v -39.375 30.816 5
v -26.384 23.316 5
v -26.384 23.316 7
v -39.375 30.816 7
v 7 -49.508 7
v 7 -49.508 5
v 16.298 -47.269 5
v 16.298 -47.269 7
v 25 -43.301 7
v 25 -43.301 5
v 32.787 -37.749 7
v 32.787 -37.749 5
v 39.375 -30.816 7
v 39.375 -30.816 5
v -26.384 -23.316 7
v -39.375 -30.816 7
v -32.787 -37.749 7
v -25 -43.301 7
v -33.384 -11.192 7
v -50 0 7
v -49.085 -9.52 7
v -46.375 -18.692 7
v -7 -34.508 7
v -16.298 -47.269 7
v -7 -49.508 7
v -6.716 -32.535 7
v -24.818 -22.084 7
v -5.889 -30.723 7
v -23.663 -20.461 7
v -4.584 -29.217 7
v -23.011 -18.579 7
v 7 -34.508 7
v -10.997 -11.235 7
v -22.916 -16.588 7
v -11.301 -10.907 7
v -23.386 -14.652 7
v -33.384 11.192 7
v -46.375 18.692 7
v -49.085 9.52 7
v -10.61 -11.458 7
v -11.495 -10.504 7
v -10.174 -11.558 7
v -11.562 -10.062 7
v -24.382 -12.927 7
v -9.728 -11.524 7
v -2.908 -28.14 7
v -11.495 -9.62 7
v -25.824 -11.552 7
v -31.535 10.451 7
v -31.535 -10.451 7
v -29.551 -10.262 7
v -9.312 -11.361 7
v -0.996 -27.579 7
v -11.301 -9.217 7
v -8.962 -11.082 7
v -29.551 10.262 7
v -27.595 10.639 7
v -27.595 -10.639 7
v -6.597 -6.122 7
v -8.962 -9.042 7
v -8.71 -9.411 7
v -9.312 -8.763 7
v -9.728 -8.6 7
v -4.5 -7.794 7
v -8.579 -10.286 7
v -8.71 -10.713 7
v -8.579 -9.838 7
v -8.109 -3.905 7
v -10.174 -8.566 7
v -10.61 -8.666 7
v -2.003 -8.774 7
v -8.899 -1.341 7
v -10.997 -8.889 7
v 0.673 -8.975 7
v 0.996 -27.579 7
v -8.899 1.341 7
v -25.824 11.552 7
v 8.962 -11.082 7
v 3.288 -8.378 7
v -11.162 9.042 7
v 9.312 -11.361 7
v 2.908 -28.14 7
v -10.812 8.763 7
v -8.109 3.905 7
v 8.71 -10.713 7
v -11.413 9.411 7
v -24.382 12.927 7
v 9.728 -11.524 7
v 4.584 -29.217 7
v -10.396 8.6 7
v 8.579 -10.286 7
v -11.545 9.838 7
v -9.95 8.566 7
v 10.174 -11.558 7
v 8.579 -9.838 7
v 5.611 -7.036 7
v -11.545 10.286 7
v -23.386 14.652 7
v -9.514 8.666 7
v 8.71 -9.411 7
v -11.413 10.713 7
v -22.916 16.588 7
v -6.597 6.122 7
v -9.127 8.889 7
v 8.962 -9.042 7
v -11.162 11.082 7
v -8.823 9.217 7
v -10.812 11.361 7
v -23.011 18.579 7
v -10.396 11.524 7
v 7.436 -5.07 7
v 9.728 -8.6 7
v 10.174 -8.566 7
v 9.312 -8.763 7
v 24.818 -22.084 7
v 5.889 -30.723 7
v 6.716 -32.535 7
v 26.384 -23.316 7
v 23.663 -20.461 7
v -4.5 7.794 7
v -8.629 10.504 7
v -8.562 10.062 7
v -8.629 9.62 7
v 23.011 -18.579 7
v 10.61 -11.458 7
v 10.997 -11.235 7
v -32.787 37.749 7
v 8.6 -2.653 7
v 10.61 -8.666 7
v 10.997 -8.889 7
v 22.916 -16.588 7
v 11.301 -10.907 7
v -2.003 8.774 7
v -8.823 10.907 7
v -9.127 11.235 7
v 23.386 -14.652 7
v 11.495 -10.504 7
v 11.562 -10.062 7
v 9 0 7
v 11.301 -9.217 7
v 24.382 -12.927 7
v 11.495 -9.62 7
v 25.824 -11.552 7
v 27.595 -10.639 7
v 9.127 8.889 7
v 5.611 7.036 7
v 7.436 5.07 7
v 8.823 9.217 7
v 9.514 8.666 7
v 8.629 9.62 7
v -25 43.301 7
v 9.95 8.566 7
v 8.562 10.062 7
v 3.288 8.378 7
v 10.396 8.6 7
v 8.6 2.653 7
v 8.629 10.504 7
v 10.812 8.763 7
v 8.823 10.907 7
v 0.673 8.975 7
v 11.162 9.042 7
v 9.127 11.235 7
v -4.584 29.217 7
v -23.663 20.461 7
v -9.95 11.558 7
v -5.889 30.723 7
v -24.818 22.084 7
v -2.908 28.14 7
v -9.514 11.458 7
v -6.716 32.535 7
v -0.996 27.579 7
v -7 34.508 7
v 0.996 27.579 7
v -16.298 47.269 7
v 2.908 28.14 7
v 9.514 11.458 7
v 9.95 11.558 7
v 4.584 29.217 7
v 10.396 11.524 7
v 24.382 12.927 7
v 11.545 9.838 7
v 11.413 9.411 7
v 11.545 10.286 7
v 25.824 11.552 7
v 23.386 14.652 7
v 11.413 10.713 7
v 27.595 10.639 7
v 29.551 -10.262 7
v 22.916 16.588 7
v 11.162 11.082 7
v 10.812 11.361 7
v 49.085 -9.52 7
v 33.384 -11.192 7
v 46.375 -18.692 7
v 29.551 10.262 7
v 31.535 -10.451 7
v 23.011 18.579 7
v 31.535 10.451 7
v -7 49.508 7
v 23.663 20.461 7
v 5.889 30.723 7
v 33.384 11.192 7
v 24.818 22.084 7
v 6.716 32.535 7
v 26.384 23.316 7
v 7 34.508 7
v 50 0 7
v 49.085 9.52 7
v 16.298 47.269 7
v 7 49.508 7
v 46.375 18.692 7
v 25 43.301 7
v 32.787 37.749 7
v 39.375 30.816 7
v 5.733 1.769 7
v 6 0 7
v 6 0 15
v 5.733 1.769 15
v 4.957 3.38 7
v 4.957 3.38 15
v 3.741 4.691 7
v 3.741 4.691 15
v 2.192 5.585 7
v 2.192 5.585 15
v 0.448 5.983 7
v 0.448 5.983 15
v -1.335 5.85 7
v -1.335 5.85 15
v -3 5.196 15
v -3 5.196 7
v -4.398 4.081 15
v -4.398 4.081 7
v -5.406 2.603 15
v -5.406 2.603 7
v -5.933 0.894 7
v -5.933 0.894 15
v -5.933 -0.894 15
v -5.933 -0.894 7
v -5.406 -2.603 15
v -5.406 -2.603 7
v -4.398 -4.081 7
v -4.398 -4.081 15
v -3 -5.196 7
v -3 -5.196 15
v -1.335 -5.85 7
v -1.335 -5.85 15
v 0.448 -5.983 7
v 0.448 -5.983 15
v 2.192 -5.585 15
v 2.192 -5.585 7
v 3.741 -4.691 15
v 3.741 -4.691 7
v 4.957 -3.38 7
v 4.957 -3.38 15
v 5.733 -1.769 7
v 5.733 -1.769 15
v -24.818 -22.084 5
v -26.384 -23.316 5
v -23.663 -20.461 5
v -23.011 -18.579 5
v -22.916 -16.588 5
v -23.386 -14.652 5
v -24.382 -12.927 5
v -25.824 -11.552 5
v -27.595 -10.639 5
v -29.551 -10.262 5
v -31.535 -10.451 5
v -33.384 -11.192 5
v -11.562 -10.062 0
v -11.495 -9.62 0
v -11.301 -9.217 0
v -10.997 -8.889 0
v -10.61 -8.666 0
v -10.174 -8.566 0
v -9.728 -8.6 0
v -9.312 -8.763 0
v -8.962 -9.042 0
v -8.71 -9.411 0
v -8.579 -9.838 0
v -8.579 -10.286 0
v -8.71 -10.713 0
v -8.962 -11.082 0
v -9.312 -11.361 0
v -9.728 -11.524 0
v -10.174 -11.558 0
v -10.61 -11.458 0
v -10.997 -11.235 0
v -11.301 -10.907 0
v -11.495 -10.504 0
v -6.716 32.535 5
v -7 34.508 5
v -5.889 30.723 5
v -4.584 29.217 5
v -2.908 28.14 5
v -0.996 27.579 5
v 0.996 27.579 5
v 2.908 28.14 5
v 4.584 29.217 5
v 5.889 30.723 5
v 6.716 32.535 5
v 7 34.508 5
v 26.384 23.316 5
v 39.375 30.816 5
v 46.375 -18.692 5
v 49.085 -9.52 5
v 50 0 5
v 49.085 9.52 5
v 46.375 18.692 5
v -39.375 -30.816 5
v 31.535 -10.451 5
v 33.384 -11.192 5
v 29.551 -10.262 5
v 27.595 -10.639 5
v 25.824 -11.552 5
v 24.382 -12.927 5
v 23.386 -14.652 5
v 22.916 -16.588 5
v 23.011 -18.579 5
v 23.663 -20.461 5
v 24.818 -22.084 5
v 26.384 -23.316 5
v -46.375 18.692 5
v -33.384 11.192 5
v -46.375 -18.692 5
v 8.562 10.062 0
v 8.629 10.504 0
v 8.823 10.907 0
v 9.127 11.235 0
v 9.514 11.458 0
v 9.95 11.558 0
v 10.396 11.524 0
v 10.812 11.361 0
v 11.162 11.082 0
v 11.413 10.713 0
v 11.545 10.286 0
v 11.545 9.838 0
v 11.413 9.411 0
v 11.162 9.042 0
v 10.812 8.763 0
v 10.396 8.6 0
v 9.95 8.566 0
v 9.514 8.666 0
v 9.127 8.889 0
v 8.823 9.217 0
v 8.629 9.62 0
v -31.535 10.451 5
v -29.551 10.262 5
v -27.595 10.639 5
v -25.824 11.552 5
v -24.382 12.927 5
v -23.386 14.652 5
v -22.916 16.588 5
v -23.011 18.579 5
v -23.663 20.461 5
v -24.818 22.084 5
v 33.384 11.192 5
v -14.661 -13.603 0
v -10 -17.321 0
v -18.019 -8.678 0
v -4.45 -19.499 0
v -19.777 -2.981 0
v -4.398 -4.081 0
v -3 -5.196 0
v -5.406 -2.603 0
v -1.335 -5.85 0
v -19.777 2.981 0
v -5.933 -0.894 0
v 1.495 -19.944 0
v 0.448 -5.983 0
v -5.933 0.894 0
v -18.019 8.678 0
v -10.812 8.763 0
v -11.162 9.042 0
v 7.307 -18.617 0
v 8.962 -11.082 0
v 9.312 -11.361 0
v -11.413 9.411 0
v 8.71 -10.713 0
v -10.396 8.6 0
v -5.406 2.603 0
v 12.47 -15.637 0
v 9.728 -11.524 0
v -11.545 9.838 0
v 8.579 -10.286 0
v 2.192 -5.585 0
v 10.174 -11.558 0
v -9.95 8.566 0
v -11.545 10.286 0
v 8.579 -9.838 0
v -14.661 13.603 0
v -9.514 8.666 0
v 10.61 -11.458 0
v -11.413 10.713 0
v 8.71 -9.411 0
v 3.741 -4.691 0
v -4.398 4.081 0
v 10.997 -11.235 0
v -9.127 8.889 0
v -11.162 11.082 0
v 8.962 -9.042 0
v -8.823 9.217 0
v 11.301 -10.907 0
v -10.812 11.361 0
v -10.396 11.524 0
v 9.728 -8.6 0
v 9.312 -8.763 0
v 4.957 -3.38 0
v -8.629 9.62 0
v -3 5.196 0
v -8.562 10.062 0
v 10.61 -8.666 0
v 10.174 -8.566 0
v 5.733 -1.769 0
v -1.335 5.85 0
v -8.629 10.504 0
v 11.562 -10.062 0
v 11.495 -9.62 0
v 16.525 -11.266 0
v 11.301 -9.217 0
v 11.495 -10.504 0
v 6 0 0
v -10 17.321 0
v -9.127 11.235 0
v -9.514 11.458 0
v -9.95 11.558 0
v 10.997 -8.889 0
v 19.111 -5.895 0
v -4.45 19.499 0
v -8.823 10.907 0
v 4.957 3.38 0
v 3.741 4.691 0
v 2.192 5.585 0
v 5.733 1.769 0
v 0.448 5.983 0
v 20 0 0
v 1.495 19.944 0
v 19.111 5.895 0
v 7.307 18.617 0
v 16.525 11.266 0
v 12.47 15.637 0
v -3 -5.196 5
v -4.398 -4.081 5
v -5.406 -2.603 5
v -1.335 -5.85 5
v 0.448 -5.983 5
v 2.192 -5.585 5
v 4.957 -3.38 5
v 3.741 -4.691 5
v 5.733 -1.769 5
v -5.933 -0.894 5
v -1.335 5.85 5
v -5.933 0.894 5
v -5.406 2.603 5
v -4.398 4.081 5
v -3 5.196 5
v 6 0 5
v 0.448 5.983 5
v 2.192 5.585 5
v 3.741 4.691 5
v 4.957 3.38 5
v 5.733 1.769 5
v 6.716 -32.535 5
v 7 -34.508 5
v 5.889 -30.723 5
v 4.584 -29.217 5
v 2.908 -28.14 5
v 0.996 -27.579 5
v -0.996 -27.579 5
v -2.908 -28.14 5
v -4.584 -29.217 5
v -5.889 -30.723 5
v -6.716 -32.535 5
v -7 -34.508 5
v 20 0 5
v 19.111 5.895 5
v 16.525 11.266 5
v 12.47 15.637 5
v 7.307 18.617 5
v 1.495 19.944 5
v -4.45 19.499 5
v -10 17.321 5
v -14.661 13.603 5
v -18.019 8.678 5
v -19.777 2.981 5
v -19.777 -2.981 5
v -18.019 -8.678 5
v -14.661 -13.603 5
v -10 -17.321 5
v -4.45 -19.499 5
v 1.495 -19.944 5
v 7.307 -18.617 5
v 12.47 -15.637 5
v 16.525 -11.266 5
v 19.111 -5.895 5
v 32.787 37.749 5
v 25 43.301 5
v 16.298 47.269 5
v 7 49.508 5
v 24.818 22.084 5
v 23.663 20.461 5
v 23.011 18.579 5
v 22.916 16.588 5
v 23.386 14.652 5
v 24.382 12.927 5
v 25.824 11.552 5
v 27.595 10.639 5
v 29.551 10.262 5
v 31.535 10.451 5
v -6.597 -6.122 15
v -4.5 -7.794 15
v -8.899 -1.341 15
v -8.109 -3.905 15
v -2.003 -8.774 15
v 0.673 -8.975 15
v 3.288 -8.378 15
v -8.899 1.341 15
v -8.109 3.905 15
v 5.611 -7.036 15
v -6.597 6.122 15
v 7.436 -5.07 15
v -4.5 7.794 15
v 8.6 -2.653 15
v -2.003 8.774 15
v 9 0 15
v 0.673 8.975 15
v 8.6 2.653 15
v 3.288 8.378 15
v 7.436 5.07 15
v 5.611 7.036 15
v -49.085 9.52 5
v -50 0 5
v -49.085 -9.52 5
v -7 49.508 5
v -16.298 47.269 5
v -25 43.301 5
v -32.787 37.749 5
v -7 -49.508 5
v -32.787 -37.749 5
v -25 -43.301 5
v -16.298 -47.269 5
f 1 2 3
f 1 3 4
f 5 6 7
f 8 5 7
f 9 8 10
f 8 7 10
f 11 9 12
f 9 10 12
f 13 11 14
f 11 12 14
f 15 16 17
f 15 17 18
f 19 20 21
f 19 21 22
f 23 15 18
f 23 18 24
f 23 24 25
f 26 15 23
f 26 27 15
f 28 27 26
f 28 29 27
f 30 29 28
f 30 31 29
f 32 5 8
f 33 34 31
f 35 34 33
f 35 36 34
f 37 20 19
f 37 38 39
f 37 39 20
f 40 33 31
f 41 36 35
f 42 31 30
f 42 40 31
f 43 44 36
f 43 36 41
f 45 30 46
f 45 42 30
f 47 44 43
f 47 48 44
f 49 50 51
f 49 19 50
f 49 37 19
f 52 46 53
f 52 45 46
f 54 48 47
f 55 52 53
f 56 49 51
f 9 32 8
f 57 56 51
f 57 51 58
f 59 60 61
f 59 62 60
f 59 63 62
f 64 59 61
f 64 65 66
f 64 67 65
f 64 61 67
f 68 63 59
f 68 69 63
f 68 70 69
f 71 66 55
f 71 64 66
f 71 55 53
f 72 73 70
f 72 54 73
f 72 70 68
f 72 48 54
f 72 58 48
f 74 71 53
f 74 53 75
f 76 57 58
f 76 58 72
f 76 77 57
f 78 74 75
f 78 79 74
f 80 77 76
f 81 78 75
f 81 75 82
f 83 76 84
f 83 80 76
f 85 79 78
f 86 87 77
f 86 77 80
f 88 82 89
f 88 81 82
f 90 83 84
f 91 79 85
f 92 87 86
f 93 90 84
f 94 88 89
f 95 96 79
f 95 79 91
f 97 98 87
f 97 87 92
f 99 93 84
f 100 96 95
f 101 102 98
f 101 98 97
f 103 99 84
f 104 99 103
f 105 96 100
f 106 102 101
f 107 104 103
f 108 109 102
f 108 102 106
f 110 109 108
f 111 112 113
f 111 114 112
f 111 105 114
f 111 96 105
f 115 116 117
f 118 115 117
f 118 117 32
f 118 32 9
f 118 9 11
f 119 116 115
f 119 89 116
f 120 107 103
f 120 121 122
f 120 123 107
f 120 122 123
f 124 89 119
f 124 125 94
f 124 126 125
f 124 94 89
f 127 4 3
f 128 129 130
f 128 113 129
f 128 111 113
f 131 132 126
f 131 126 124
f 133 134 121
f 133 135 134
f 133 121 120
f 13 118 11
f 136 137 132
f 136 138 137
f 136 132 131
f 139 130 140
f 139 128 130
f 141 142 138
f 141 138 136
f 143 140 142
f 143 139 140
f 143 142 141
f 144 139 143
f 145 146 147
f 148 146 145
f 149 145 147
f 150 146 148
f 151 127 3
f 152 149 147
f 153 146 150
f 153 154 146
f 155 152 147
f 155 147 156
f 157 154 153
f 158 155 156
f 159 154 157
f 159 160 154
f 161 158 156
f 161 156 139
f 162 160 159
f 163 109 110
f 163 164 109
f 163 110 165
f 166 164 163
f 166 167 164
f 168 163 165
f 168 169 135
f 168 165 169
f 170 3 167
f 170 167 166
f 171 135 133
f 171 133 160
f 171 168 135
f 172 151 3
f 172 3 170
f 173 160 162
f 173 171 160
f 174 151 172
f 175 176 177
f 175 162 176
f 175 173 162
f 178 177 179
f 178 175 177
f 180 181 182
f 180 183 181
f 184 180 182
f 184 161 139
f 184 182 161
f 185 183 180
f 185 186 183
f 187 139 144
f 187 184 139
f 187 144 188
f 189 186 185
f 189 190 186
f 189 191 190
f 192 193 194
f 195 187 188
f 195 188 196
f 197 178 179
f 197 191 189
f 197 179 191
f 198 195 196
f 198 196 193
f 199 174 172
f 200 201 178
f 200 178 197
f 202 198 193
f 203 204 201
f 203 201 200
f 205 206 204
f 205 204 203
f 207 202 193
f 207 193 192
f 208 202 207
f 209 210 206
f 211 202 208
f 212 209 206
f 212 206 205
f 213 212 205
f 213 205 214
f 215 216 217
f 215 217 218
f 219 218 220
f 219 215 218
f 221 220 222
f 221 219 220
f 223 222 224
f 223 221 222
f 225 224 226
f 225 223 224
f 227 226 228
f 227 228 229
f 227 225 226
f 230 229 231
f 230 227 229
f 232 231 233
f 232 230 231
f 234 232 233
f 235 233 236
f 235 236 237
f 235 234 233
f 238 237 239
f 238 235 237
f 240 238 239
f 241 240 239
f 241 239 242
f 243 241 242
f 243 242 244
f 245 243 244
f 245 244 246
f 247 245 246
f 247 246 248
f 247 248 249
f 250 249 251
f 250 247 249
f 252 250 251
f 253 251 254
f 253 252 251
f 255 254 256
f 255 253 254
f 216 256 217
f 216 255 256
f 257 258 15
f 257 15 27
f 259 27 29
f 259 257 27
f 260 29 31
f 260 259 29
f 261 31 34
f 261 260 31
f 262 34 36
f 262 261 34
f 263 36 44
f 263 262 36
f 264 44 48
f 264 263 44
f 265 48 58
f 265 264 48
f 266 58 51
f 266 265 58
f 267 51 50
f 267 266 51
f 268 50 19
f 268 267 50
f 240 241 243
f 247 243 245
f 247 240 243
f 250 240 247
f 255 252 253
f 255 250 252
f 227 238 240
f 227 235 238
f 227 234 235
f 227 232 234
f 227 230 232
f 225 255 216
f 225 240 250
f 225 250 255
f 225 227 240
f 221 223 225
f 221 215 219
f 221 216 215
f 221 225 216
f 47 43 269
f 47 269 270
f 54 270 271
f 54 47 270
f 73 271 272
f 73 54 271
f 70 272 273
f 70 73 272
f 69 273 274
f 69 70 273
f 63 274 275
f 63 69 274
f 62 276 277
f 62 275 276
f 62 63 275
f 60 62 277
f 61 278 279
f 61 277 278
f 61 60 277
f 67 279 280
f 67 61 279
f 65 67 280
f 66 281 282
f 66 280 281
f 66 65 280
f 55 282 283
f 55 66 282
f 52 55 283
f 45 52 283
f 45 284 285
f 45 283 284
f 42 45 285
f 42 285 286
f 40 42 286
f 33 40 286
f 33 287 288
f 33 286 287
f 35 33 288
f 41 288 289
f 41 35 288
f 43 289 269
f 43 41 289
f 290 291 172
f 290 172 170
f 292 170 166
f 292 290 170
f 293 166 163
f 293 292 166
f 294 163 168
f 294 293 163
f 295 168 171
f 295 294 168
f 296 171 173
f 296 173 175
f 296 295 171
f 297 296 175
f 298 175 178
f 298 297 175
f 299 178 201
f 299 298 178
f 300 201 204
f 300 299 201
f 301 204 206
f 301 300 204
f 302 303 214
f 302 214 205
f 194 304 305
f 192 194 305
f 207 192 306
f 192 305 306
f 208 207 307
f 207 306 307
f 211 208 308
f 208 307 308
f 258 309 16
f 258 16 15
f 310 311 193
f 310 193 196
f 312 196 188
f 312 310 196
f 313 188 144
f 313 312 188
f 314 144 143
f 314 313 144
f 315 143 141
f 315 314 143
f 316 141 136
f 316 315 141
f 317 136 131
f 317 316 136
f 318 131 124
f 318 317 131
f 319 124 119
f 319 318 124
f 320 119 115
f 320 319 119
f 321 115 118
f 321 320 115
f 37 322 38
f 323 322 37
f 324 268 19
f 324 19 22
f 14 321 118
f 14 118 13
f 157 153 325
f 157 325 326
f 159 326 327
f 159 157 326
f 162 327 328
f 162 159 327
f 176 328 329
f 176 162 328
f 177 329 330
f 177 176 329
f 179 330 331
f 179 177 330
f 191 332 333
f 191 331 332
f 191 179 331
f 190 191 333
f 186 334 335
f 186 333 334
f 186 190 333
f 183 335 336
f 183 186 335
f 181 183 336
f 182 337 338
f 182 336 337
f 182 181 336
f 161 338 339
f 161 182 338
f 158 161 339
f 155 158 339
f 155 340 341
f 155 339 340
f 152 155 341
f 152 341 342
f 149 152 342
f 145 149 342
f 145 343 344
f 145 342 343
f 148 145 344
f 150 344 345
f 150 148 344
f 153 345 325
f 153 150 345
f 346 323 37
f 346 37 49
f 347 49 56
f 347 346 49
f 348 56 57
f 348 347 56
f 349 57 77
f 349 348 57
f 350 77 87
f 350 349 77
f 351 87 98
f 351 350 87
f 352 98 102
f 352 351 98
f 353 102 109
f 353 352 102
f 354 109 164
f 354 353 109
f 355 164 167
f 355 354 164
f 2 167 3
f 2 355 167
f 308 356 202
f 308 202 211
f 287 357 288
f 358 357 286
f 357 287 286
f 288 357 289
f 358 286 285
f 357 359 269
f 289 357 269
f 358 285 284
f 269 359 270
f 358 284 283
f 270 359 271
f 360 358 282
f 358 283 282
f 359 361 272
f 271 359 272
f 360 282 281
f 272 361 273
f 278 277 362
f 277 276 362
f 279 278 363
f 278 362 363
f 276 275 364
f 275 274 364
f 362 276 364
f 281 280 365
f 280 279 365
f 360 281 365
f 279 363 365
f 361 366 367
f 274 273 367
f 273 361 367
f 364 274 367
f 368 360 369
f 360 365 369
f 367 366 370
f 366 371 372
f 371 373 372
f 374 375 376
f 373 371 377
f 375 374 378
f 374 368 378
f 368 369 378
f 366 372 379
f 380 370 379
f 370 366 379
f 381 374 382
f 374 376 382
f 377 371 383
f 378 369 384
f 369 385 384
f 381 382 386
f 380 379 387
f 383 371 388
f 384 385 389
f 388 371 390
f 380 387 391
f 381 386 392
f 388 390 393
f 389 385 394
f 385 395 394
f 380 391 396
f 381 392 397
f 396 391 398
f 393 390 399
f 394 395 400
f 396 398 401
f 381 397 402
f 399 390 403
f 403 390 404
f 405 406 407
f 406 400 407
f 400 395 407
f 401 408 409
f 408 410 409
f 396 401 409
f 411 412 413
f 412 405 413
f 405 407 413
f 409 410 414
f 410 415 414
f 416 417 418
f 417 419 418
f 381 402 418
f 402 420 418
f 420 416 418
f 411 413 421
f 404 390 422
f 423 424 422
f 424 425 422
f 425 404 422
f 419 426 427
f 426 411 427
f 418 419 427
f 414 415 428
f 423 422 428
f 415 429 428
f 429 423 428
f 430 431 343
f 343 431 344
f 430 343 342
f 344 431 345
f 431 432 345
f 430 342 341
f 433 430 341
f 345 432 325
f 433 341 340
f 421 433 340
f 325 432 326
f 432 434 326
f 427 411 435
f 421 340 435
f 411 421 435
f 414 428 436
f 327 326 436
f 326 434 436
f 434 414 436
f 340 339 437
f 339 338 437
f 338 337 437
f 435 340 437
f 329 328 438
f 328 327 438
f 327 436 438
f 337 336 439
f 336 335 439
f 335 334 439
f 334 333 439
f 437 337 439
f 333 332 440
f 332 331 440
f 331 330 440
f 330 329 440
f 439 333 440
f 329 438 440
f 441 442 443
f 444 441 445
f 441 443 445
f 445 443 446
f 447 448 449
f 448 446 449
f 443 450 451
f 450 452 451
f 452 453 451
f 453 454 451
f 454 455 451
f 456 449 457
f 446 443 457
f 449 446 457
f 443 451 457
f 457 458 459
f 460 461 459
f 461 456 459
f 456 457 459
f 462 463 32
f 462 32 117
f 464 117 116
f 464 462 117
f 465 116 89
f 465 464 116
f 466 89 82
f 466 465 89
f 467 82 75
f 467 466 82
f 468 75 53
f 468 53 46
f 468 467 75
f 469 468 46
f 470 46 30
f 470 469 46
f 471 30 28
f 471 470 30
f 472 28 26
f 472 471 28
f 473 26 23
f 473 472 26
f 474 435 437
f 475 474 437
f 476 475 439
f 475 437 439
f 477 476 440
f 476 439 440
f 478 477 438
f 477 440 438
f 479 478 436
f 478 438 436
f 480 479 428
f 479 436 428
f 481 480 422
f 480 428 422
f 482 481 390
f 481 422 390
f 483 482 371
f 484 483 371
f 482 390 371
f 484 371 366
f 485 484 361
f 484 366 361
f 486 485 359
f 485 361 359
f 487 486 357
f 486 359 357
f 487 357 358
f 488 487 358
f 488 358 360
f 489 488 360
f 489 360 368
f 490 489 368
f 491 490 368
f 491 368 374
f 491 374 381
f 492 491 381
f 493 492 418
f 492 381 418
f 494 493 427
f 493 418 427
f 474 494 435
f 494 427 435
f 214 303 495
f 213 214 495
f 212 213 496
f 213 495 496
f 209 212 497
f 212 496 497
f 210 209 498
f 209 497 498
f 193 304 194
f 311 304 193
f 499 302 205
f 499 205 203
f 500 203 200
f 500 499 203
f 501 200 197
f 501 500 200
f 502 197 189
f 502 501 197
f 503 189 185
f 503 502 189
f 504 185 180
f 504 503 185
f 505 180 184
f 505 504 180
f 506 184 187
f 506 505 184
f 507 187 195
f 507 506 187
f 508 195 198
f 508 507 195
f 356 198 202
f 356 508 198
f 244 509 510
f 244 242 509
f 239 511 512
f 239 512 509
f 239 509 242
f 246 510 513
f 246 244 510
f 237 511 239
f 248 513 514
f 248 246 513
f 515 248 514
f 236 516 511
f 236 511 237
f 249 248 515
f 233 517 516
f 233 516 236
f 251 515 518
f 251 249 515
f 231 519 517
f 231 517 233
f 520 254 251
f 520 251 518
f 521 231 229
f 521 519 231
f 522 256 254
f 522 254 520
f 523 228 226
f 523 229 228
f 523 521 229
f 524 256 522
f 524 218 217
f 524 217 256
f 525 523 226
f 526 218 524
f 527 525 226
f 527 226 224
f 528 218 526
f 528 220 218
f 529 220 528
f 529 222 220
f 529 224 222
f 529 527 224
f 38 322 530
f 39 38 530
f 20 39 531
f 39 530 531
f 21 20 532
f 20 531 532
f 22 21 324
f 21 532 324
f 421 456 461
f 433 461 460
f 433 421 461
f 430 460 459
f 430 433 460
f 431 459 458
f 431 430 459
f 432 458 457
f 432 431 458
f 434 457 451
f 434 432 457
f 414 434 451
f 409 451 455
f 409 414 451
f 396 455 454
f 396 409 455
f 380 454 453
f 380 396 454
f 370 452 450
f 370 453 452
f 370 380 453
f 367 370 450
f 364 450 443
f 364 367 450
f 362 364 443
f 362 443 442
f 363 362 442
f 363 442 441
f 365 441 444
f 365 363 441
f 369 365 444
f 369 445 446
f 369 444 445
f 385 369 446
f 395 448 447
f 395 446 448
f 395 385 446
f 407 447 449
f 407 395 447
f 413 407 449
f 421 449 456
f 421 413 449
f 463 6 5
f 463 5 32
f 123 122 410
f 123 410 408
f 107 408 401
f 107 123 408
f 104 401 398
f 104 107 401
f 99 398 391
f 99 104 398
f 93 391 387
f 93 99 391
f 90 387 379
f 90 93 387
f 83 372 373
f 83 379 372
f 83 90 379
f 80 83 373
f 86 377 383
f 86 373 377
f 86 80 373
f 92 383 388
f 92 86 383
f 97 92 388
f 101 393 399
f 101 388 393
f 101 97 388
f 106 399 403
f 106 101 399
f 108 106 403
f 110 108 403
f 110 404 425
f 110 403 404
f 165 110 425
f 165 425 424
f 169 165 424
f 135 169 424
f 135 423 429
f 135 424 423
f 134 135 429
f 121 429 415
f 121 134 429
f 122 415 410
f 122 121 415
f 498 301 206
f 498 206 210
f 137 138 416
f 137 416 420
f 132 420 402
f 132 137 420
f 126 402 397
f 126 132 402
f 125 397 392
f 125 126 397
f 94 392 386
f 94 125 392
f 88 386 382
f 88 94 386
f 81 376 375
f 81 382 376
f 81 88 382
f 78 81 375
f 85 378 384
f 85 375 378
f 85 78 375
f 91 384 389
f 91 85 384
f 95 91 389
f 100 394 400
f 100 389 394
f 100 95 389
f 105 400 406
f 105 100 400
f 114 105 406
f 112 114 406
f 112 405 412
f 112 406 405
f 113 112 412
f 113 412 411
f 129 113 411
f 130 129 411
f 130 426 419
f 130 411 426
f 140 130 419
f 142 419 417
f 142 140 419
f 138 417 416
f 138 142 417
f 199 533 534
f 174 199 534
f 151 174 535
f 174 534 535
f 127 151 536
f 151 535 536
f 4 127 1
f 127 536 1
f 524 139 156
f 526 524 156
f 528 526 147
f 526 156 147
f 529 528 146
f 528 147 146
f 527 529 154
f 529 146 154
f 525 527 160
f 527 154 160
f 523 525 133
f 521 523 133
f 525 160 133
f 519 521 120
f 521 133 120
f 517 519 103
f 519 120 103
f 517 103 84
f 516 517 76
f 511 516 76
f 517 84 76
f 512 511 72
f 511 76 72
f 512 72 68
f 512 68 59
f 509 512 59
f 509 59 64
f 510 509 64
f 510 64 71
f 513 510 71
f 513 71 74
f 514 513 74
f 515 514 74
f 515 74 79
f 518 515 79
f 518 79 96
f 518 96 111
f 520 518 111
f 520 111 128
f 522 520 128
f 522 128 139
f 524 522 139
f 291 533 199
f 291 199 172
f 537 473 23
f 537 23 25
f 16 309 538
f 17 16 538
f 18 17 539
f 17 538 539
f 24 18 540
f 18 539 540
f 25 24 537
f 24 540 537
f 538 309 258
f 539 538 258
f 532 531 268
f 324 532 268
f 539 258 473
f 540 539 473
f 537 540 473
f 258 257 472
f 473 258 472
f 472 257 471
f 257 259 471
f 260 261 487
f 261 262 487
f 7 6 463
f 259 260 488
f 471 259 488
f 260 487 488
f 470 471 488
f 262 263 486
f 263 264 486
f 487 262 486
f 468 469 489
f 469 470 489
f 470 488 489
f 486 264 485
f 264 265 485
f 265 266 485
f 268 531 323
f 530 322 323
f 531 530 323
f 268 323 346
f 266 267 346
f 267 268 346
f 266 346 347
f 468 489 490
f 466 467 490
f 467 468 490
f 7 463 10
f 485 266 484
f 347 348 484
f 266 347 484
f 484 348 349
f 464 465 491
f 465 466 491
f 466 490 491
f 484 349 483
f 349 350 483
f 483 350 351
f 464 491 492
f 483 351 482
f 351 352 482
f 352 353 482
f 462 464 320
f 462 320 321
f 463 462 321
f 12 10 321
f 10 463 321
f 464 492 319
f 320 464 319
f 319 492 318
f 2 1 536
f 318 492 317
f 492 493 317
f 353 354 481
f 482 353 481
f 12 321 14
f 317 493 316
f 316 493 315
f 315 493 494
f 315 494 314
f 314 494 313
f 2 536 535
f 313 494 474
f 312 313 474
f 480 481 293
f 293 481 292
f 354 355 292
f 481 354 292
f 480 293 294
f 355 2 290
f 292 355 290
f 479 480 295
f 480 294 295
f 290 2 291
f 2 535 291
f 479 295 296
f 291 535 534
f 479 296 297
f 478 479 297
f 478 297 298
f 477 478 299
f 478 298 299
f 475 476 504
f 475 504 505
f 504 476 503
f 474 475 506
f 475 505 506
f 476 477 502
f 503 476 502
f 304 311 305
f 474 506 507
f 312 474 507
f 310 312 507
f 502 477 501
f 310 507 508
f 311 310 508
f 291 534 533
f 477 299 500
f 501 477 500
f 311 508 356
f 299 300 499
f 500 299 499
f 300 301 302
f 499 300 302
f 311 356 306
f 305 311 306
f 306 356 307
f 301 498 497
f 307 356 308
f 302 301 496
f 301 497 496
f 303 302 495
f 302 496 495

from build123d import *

# Parameters (mm, degrees)
SKETCH1_R               = 20
SKETCH1_R_2             = 6
SKETCH1_R_3             = 1.5
BOSS_EXTRUDE1_DEPTH     = 5
SKETCH2_R               = 9
SKETCH2_R_2             = 6
BOSS_EXTRUDE2_DEPTH     = 10
SKETCH3_R               = 50
BOSS_EXTRUDE3_DEPTH     = 2
CUT_EXTRUDE1_START      = -2
CUT_EXTRUDE1_DEPTH      = 2
CUT_EXTRUDE2_DEPTH      = 72.944422994
CUT_EXTRUDE2_DEPTH_BACK = 72.944422994
SKETCH5_R               = 1.5


with BuildPart() as part:
    # Sketch1 → Boss-Extrude1 (new body)
    with BuildSketch(Plane.XY):
        Circle(SKETCH1_R)
        Circle(SKETCH1_R_2, mode=Mode.SUBTRACT)
        with Locations((-10.061951403, 10.061951403)):
            Circle(SKETCH1_R_3, mode=Mode.SUBTRACT)
        with Locations(Location((10.061951403, 10.061951403, 0), (0, 0, 180))):
            Circle(SKETCH1_R_3, mode=Mode.SUBTRACT)
        with Locations((10.061951403, -10.061951403)):
            Circle(SKETCH1_R_3, mode=Mode.SUBTRACT)
        with Locations(Location((-10.061951403, -10.061951403, 0), (0, 0, 180))):
            Circle(SKETCH1_R_3, mode=Mode.SUBTRACT)
    extrude(amount=BOSS_EXTRUDE1_DEPTH)

    # Sketch2 → Boss-Extrude2 (add)
    with BuildSketch(Plane.XY.offset(5)):
        Circle(SKETCH2_R)
        Circle(SKETCH2_R_2, mode=Mode.SUBTRACT)
    extrude(amount=BOSS_EXTRUDE2_DEPTH)

    # Sketch3 → Boss-Extrude3 (add)
    with BuildSketch(Plane.XY.offset(5)):
        Circle(SKETCH3_R)
    extrude(amount=BOSS_EXTRUDE3_DEPTH)

    # Sketch4 → Cut-Extrude1 (cut)
    with BuildSketch(Plane.XY.offset(7).offset(CUT_EXTRUDE1_START)):
        with BuildLine():
            Line((-7, 49.507575178), (-7, 34.507575178))
            ThreePointArc((-7, 34.507575178), (0, 27.507575178), (7, 34.507575178))
            Line((7, 34.507575178), (7, 49.507575178))
            ThreePointArc((7, 49.507575178), (0, 50), (-7, 49.507575178))
        make_face()
        with BuildLine():
            Line((39.374817784, 30.815965415), (26.384436727, 23.315965415))
            ThreePointArc((26.384436727, 23.315965415), (23.822258901, 13.753787589), (33.384436727, 11.191609762))
            Line((33.384436727, 11.191609762), (46.374817784, 18.691609762))
            ThreePointArc((46.374817784, 18.691609762), (43.301270189, 25), (39.374817784, 30.815965415))
        make_face()
        with BuildLine():
            Line((46.374817784, -18.691609762), (33.384436727, -11.191609762))
            ThreePointArc((33.384436727, -11.191609762), (23.822258901, -13.753787589), (26.384436727, -23.315965415))
            Line((26.384436727, -23.315965415), (39.374817784, -30.815965415))
            ThreePointArc((39.374817784, -30.815965415), (43.301270189, -25), (46.374817784, -18.691609762))
        make_face()
        with BuildLine():
            Line((7, -49.507575178), (7, -34.507575178))
            ThreePointArc((7, -34.507575178), (0, -27.507575178), (-7, -34.507575178))
            Line((-7, -34.507575178), (-7, -49.507575178))
            ThreePointArc((-7, -49.507575178), (0, -50), (7, -49.507575178))
        make_face()
        with BuildLine():
            Line((-39.374817784, -30.815965415), (-26.384436727, -23.315965415))
            ThreePointArc((-26.384436727, -23.315965415), (-23.822258901, -13.753787589), (-33.384436727, -11.191609762))
            Line((-33.384436727, -11.191609762), (-46.374817784, -18.691609762))
            ThreePointArc((-46.374817784, -18.691609762), (-43.301270189, -25), (-39.374817784, -30.815965415))
        make_face()
        with BuildLine():
            Line((-46.374817784, 18.691609762), (-33.384436727, 11.191609762))
            ThreePointArc((-33.384436727, 11.191609762), (-23.822258901, 13.753787589), (-26.384436727, 23.315965415))
            Line((-26.384436727, 23.315965415), (-39.374817784, 30.815965415))
            ThreePointArc((-39.374817784, 30.815965415), (-43.301270189, 25), (-46.374817784, 18.691609762))
        make_face()
    extrude(amount=CUT_EXTRUDE1_DEPTH, mode=Mode.SUBTRACT)

    # Sketch5 → Cut-Extrude2 (cut, two sides: drawn at the far end of the back side and taken through both)
    with BuildSketch(Plane(origin=(0, 0, 0), x_dir=(-1, 0, 0), z_dir=(0, 0, -1)).offset(-CUT_EXTRUDE2_DEPTH_BACK)):
        with Locations((-10.061951403, 10.061951403)):
            Circle(SKETCH5_R)
        with Locations(Location((-10.061951403, -10.061951403, 0), (0, 0, 180))):
            Circle(SKETCH5_R)
        with Locations(Location((10.061951403, 10.061951403, 0), (0, 0, 180))):
            Circle(SKETCH5_R)
        with Locations((10.061951403, -10.061951403)):
            Circle(SKETCH5_R)
    extrude(amount=CUT_EXTRUDE2_DEPTH + CUT_EXTRUDE2_DEPTH_BACK, mode=Mode.SUBTRACT)


solid = part.part
